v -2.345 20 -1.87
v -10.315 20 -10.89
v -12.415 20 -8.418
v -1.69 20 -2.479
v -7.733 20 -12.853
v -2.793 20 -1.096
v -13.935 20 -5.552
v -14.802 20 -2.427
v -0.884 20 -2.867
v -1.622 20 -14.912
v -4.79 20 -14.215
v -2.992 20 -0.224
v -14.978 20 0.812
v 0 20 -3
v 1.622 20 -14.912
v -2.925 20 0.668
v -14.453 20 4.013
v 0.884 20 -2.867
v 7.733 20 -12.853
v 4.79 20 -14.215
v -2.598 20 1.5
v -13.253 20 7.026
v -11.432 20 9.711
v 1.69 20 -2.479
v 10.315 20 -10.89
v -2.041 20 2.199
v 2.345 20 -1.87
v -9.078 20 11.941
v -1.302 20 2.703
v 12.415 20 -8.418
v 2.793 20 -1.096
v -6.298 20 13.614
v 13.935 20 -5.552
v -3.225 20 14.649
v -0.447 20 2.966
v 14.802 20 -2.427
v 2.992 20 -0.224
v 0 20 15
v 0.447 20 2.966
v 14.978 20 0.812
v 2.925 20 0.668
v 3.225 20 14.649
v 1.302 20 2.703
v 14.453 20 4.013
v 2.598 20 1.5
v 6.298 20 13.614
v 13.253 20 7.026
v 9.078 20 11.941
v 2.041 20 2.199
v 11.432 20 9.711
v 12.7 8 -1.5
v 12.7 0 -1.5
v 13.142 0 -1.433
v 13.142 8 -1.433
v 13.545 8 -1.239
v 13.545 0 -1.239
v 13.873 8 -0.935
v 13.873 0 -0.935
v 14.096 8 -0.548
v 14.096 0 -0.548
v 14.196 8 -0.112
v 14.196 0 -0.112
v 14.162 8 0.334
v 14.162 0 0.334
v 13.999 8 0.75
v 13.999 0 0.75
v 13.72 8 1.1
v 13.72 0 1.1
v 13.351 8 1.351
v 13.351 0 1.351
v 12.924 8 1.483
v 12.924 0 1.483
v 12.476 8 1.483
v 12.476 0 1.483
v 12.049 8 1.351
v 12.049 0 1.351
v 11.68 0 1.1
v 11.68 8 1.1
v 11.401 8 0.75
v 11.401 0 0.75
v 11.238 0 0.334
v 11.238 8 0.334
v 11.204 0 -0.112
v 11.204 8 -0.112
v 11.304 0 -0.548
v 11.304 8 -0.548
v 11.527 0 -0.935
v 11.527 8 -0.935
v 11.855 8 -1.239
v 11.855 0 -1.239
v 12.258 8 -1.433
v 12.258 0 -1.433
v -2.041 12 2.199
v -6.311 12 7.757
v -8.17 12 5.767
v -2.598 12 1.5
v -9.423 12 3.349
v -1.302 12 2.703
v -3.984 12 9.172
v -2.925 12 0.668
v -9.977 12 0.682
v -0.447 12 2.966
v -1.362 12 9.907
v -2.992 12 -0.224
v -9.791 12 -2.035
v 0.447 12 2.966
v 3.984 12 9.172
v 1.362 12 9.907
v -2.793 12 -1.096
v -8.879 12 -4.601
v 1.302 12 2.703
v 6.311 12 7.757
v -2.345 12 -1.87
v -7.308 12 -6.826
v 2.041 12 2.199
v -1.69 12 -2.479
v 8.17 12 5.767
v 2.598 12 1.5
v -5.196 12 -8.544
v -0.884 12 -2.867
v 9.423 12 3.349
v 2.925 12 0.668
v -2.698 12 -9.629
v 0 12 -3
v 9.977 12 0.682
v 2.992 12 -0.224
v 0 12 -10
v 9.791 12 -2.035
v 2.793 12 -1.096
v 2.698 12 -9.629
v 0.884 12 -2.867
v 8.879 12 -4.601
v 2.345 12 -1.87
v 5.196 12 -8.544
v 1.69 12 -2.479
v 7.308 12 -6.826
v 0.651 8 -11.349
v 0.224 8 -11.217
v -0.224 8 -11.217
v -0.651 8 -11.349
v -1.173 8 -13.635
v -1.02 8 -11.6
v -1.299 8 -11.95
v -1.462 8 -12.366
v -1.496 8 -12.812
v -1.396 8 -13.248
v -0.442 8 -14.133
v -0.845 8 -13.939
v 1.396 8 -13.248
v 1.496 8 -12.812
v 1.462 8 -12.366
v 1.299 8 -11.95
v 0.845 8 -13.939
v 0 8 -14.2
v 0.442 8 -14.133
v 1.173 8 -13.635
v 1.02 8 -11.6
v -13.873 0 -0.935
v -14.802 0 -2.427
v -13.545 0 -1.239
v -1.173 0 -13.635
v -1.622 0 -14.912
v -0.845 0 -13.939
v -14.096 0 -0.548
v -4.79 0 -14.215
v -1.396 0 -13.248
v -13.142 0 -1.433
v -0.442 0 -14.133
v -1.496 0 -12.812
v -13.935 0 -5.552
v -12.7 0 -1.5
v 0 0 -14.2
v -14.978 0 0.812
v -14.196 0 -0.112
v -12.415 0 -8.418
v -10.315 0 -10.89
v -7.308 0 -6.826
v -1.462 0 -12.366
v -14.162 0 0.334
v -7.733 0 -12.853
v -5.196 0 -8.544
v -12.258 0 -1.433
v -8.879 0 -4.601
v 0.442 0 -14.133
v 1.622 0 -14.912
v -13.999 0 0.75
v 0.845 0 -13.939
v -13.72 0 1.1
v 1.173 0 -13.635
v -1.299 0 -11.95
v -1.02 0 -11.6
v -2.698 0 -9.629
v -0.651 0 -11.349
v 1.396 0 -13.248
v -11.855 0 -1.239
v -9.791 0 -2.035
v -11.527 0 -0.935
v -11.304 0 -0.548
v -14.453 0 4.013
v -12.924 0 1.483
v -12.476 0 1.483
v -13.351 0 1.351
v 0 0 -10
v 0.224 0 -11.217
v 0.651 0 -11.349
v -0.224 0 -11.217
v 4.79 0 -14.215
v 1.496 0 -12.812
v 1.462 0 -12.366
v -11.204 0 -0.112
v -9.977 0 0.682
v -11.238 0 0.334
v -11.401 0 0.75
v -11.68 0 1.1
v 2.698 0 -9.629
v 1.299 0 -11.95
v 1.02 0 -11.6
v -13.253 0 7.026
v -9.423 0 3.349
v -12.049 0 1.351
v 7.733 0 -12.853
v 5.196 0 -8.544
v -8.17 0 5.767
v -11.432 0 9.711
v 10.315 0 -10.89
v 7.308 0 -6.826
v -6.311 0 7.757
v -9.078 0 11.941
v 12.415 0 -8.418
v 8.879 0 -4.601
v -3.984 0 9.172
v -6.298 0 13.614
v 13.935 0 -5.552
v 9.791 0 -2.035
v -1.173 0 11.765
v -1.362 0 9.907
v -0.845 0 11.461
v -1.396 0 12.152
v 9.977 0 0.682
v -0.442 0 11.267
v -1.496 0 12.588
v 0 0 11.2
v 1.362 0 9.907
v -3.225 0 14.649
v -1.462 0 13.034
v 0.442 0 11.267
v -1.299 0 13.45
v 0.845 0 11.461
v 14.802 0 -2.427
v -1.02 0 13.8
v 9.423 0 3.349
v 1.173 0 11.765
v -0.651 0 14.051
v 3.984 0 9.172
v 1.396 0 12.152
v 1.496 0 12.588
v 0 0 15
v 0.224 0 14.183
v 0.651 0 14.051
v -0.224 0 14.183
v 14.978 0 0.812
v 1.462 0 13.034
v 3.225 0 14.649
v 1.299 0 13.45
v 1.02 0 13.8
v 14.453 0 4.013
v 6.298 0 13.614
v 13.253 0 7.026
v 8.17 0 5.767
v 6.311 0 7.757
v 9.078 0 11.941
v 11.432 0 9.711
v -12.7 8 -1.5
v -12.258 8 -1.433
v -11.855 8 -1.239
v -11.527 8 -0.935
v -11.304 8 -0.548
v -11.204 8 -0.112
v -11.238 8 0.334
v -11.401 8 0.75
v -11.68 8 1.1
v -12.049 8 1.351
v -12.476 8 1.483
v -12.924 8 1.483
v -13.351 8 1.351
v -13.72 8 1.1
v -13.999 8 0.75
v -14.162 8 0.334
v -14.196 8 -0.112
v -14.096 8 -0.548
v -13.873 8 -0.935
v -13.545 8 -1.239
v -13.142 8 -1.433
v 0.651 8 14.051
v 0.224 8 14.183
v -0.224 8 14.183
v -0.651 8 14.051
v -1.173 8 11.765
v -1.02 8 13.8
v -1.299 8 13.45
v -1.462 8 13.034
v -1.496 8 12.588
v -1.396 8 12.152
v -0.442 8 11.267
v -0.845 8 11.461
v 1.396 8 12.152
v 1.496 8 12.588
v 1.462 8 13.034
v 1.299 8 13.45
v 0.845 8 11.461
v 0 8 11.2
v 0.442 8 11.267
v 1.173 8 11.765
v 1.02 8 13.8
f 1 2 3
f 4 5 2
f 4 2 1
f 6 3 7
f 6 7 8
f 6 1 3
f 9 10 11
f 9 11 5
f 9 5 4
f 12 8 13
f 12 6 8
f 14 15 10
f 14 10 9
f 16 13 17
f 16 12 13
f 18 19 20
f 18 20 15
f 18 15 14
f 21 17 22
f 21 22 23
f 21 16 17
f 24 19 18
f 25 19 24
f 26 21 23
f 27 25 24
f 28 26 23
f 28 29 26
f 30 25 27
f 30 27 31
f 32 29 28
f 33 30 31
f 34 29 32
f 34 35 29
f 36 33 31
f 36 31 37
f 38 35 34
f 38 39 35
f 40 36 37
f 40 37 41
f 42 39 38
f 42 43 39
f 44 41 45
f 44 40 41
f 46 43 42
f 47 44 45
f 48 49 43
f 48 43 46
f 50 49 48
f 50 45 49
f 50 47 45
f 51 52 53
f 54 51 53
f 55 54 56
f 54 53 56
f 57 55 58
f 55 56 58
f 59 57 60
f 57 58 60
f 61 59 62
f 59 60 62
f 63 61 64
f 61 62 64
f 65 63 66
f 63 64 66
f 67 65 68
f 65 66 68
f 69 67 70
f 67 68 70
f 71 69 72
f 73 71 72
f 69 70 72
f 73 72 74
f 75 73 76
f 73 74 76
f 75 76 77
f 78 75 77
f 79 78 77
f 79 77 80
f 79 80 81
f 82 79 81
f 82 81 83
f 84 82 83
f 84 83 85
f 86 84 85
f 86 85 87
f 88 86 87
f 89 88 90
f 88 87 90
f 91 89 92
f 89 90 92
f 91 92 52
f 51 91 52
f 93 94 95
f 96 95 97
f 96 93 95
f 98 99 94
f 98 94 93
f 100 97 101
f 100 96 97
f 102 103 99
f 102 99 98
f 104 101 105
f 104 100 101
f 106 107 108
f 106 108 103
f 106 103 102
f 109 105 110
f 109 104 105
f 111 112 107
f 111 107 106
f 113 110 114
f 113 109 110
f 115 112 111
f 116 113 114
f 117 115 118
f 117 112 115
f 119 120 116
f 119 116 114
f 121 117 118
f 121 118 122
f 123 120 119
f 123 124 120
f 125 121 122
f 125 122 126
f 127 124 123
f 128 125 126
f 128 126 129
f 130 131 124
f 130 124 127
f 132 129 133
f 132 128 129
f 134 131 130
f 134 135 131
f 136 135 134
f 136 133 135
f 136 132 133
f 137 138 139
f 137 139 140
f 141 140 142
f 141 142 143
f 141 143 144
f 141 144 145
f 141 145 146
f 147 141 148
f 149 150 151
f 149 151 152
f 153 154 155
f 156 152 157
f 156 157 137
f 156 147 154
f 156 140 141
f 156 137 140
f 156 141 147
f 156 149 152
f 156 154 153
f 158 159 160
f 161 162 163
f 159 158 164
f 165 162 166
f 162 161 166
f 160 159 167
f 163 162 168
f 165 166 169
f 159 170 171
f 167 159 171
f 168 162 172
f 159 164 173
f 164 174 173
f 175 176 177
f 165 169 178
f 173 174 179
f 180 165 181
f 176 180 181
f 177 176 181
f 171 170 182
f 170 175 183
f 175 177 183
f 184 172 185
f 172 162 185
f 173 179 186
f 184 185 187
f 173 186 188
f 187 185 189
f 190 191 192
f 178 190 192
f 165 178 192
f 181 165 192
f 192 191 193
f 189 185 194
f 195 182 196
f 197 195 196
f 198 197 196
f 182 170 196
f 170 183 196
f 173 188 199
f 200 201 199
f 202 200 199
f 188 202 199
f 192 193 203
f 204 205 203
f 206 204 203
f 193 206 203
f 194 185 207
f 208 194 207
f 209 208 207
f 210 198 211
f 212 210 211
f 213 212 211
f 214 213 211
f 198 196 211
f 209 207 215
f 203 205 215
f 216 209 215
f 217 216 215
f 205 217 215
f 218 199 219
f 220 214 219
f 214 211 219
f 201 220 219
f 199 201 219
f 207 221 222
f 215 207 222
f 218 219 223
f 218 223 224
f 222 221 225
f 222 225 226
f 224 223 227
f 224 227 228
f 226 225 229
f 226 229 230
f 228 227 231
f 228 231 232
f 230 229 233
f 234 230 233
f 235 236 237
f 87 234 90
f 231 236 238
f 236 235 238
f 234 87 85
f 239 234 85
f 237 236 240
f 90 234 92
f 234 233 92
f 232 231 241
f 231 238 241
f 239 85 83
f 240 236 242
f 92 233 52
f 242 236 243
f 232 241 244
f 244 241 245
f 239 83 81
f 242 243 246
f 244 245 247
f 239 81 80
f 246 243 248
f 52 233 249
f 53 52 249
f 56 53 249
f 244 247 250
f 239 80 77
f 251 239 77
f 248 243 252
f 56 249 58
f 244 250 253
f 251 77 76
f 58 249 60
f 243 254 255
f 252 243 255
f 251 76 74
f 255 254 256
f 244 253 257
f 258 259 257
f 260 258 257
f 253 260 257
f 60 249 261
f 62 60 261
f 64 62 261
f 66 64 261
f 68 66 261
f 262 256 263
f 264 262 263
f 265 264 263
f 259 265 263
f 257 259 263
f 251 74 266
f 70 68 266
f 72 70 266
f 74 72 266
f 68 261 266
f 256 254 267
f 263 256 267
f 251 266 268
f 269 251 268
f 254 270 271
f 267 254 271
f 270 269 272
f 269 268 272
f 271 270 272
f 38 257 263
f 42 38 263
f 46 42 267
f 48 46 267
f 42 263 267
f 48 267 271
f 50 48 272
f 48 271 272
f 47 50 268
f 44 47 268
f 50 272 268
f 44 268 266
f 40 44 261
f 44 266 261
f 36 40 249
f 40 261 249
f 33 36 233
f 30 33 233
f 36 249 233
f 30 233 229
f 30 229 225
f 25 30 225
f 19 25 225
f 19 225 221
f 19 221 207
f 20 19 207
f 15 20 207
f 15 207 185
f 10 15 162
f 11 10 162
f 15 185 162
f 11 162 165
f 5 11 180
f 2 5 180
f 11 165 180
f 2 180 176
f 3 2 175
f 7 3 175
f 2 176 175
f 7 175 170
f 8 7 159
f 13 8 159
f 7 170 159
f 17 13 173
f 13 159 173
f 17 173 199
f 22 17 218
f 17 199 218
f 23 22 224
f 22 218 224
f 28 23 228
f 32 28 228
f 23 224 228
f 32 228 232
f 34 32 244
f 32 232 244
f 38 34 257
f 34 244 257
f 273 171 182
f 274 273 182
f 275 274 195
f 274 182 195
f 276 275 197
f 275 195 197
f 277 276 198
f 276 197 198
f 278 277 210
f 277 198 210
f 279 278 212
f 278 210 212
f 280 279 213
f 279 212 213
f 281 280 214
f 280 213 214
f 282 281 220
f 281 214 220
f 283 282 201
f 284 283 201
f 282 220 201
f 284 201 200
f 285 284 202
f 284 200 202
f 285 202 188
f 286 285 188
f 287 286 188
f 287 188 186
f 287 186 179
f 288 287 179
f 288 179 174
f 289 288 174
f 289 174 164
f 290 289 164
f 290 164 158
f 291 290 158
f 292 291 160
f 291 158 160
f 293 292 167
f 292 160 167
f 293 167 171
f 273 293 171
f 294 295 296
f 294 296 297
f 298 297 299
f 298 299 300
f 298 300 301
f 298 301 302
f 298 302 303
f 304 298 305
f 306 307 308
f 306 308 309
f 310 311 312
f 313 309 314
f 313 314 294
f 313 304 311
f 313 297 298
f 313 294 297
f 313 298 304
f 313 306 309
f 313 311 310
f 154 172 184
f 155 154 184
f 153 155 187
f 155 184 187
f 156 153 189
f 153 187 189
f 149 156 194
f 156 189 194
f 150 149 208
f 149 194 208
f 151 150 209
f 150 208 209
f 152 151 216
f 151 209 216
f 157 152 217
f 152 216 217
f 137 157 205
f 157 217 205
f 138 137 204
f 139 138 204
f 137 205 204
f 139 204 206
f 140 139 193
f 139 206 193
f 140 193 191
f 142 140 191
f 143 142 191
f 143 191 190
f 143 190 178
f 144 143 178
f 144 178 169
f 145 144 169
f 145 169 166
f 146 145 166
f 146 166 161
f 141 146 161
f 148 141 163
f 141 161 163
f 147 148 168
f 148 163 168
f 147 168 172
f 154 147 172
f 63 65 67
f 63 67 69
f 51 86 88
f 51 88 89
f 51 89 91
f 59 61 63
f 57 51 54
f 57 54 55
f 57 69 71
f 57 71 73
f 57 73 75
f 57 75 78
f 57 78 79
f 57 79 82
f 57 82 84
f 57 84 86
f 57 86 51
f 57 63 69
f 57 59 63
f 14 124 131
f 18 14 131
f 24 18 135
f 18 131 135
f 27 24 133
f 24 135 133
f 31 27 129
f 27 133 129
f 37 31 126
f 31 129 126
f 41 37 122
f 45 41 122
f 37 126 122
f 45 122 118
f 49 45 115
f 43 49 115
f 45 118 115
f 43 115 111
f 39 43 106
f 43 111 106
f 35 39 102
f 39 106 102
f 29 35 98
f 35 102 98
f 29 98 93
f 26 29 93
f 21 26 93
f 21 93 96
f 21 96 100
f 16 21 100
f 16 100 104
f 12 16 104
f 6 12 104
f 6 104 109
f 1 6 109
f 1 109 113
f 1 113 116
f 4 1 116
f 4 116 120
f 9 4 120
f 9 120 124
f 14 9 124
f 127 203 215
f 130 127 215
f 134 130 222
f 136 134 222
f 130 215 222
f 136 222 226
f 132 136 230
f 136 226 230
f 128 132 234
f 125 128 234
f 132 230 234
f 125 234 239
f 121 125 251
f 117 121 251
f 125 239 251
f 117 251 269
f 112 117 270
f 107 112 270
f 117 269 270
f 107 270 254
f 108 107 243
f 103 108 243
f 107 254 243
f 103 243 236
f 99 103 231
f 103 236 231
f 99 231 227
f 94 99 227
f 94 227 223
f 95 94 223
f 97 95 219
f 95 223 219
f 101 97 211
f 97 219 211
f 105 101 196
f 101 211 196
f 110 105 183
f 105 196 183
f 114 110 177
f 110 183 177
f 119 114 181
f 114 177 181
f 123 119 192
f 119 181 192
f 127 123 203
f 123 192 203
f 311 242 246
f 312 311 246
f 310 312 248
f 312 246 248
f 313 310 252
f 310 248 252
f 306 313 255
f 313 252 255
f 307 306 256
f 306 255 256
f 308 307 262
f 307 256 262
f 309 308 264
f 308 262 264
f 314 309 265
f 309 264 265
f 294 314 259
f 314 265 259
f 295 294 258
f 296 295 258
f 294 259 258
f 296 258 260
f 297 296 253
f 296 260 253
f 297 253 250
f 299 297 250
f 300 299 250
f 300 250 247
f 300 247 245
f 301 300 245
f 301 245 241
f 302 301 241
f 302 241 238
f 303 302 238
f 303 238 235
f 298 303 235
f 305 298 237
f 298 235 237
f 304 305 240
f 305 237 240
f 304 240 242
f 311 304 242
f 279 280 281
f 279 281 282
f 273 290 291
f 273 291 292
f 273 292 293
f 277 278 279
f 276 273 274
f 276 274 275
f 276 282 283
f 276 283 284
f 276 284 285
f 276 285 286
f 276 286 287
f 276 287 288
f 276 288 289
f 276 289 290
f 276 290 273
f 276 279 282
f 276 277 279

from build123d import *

# Parameters (mm, degrees)
ESQUISSE1_R             = 15
BOSS_EXTRU_1_DEPTH      = 20
ESQUISSE2_R             = 10
ENL_V_MAT_EXTRU_1_DEPTH = 12
ESQUISSE3_R             = 3
ENL_V_MAT_EXTRU_2_DEPTH = 12
ESQUISSE4_R             = 1.5
ENL_V_MAT_EXTRU_3_DEPTH = 8


with BuildPart() as part:
    # Esquisse1 → Boss.-Extru.1 (new body)
    with BuildSketch(Plane(origin=(0, 0, 0), x_dir=(1, 0, 0), z_dir=(0, 1, 0))):
        with Locations(Location((0, 0, 0), (0, 0, 270))):
            Circle(ESQUISSE1_R)
    extrude(amount=BOSS_EXTRU_1_DEPTH)

    # Esquisse2 → Enlèv. mat.-Extru.1 (cut)
    with BuildSketch(Plane(origin=(0, 0, 0), x_dir=(-1, 0, 0), z_dir=(0, -1, 0))):
        with Locations(Location((0, 0, 0), (0, 0, 90))):
            Circle(ESQUISSE2_R)
    extrude(amount=-ENL_V_MAT_EXTRU_1_DEPTH, mode=Mode.SUBTRACT)

    # Esquisse3 → Enlèv. mat.-Extru.2 (cut)
    with BuildSketch(Plane(origin=(0, 12, 0), x_dir=(-1, 0, 0), z_dir=(0, -1, 0))):
        with Locations(Location((0, 0, 0), (0, 0, 90))):
            Circle(ESQUISSE3_R)
    extrude(amount=-ENL_V_MAT_EXTRU_2_DEPTH, mode=Mode.SUBTRACT)

    # Esquisse4 → Enlèv. mat.-Extru.3 (cut)
    with BuildSketch(Plane(origin=(0, 0, 0), x_dir=(-1, 0, 0), z_dir=(0, -1, 0))):
        with Locations(Location((-12.7, 0, 0), (0, 0, 90))):
            Circle(ESQUISSE4_R)
        with Locations(Location((0, -12.7, 0), (0, 0, 90))):
            Circle(ESQUISSE4_R)
        with Locations(Location((12.7, 0, 0), (0, 0, 90))):
            Circle(ESQUISSE4_R)
        with Locations(Location((0, 12.7, 0), (0, 0, 90))):
            Circle(ESQUISSE4_R)
    extrude(amount=-ENL_V_MAT_EXTRU_3_DEPTH, mode=Mode.SUBTRACT)


solid = part.part
